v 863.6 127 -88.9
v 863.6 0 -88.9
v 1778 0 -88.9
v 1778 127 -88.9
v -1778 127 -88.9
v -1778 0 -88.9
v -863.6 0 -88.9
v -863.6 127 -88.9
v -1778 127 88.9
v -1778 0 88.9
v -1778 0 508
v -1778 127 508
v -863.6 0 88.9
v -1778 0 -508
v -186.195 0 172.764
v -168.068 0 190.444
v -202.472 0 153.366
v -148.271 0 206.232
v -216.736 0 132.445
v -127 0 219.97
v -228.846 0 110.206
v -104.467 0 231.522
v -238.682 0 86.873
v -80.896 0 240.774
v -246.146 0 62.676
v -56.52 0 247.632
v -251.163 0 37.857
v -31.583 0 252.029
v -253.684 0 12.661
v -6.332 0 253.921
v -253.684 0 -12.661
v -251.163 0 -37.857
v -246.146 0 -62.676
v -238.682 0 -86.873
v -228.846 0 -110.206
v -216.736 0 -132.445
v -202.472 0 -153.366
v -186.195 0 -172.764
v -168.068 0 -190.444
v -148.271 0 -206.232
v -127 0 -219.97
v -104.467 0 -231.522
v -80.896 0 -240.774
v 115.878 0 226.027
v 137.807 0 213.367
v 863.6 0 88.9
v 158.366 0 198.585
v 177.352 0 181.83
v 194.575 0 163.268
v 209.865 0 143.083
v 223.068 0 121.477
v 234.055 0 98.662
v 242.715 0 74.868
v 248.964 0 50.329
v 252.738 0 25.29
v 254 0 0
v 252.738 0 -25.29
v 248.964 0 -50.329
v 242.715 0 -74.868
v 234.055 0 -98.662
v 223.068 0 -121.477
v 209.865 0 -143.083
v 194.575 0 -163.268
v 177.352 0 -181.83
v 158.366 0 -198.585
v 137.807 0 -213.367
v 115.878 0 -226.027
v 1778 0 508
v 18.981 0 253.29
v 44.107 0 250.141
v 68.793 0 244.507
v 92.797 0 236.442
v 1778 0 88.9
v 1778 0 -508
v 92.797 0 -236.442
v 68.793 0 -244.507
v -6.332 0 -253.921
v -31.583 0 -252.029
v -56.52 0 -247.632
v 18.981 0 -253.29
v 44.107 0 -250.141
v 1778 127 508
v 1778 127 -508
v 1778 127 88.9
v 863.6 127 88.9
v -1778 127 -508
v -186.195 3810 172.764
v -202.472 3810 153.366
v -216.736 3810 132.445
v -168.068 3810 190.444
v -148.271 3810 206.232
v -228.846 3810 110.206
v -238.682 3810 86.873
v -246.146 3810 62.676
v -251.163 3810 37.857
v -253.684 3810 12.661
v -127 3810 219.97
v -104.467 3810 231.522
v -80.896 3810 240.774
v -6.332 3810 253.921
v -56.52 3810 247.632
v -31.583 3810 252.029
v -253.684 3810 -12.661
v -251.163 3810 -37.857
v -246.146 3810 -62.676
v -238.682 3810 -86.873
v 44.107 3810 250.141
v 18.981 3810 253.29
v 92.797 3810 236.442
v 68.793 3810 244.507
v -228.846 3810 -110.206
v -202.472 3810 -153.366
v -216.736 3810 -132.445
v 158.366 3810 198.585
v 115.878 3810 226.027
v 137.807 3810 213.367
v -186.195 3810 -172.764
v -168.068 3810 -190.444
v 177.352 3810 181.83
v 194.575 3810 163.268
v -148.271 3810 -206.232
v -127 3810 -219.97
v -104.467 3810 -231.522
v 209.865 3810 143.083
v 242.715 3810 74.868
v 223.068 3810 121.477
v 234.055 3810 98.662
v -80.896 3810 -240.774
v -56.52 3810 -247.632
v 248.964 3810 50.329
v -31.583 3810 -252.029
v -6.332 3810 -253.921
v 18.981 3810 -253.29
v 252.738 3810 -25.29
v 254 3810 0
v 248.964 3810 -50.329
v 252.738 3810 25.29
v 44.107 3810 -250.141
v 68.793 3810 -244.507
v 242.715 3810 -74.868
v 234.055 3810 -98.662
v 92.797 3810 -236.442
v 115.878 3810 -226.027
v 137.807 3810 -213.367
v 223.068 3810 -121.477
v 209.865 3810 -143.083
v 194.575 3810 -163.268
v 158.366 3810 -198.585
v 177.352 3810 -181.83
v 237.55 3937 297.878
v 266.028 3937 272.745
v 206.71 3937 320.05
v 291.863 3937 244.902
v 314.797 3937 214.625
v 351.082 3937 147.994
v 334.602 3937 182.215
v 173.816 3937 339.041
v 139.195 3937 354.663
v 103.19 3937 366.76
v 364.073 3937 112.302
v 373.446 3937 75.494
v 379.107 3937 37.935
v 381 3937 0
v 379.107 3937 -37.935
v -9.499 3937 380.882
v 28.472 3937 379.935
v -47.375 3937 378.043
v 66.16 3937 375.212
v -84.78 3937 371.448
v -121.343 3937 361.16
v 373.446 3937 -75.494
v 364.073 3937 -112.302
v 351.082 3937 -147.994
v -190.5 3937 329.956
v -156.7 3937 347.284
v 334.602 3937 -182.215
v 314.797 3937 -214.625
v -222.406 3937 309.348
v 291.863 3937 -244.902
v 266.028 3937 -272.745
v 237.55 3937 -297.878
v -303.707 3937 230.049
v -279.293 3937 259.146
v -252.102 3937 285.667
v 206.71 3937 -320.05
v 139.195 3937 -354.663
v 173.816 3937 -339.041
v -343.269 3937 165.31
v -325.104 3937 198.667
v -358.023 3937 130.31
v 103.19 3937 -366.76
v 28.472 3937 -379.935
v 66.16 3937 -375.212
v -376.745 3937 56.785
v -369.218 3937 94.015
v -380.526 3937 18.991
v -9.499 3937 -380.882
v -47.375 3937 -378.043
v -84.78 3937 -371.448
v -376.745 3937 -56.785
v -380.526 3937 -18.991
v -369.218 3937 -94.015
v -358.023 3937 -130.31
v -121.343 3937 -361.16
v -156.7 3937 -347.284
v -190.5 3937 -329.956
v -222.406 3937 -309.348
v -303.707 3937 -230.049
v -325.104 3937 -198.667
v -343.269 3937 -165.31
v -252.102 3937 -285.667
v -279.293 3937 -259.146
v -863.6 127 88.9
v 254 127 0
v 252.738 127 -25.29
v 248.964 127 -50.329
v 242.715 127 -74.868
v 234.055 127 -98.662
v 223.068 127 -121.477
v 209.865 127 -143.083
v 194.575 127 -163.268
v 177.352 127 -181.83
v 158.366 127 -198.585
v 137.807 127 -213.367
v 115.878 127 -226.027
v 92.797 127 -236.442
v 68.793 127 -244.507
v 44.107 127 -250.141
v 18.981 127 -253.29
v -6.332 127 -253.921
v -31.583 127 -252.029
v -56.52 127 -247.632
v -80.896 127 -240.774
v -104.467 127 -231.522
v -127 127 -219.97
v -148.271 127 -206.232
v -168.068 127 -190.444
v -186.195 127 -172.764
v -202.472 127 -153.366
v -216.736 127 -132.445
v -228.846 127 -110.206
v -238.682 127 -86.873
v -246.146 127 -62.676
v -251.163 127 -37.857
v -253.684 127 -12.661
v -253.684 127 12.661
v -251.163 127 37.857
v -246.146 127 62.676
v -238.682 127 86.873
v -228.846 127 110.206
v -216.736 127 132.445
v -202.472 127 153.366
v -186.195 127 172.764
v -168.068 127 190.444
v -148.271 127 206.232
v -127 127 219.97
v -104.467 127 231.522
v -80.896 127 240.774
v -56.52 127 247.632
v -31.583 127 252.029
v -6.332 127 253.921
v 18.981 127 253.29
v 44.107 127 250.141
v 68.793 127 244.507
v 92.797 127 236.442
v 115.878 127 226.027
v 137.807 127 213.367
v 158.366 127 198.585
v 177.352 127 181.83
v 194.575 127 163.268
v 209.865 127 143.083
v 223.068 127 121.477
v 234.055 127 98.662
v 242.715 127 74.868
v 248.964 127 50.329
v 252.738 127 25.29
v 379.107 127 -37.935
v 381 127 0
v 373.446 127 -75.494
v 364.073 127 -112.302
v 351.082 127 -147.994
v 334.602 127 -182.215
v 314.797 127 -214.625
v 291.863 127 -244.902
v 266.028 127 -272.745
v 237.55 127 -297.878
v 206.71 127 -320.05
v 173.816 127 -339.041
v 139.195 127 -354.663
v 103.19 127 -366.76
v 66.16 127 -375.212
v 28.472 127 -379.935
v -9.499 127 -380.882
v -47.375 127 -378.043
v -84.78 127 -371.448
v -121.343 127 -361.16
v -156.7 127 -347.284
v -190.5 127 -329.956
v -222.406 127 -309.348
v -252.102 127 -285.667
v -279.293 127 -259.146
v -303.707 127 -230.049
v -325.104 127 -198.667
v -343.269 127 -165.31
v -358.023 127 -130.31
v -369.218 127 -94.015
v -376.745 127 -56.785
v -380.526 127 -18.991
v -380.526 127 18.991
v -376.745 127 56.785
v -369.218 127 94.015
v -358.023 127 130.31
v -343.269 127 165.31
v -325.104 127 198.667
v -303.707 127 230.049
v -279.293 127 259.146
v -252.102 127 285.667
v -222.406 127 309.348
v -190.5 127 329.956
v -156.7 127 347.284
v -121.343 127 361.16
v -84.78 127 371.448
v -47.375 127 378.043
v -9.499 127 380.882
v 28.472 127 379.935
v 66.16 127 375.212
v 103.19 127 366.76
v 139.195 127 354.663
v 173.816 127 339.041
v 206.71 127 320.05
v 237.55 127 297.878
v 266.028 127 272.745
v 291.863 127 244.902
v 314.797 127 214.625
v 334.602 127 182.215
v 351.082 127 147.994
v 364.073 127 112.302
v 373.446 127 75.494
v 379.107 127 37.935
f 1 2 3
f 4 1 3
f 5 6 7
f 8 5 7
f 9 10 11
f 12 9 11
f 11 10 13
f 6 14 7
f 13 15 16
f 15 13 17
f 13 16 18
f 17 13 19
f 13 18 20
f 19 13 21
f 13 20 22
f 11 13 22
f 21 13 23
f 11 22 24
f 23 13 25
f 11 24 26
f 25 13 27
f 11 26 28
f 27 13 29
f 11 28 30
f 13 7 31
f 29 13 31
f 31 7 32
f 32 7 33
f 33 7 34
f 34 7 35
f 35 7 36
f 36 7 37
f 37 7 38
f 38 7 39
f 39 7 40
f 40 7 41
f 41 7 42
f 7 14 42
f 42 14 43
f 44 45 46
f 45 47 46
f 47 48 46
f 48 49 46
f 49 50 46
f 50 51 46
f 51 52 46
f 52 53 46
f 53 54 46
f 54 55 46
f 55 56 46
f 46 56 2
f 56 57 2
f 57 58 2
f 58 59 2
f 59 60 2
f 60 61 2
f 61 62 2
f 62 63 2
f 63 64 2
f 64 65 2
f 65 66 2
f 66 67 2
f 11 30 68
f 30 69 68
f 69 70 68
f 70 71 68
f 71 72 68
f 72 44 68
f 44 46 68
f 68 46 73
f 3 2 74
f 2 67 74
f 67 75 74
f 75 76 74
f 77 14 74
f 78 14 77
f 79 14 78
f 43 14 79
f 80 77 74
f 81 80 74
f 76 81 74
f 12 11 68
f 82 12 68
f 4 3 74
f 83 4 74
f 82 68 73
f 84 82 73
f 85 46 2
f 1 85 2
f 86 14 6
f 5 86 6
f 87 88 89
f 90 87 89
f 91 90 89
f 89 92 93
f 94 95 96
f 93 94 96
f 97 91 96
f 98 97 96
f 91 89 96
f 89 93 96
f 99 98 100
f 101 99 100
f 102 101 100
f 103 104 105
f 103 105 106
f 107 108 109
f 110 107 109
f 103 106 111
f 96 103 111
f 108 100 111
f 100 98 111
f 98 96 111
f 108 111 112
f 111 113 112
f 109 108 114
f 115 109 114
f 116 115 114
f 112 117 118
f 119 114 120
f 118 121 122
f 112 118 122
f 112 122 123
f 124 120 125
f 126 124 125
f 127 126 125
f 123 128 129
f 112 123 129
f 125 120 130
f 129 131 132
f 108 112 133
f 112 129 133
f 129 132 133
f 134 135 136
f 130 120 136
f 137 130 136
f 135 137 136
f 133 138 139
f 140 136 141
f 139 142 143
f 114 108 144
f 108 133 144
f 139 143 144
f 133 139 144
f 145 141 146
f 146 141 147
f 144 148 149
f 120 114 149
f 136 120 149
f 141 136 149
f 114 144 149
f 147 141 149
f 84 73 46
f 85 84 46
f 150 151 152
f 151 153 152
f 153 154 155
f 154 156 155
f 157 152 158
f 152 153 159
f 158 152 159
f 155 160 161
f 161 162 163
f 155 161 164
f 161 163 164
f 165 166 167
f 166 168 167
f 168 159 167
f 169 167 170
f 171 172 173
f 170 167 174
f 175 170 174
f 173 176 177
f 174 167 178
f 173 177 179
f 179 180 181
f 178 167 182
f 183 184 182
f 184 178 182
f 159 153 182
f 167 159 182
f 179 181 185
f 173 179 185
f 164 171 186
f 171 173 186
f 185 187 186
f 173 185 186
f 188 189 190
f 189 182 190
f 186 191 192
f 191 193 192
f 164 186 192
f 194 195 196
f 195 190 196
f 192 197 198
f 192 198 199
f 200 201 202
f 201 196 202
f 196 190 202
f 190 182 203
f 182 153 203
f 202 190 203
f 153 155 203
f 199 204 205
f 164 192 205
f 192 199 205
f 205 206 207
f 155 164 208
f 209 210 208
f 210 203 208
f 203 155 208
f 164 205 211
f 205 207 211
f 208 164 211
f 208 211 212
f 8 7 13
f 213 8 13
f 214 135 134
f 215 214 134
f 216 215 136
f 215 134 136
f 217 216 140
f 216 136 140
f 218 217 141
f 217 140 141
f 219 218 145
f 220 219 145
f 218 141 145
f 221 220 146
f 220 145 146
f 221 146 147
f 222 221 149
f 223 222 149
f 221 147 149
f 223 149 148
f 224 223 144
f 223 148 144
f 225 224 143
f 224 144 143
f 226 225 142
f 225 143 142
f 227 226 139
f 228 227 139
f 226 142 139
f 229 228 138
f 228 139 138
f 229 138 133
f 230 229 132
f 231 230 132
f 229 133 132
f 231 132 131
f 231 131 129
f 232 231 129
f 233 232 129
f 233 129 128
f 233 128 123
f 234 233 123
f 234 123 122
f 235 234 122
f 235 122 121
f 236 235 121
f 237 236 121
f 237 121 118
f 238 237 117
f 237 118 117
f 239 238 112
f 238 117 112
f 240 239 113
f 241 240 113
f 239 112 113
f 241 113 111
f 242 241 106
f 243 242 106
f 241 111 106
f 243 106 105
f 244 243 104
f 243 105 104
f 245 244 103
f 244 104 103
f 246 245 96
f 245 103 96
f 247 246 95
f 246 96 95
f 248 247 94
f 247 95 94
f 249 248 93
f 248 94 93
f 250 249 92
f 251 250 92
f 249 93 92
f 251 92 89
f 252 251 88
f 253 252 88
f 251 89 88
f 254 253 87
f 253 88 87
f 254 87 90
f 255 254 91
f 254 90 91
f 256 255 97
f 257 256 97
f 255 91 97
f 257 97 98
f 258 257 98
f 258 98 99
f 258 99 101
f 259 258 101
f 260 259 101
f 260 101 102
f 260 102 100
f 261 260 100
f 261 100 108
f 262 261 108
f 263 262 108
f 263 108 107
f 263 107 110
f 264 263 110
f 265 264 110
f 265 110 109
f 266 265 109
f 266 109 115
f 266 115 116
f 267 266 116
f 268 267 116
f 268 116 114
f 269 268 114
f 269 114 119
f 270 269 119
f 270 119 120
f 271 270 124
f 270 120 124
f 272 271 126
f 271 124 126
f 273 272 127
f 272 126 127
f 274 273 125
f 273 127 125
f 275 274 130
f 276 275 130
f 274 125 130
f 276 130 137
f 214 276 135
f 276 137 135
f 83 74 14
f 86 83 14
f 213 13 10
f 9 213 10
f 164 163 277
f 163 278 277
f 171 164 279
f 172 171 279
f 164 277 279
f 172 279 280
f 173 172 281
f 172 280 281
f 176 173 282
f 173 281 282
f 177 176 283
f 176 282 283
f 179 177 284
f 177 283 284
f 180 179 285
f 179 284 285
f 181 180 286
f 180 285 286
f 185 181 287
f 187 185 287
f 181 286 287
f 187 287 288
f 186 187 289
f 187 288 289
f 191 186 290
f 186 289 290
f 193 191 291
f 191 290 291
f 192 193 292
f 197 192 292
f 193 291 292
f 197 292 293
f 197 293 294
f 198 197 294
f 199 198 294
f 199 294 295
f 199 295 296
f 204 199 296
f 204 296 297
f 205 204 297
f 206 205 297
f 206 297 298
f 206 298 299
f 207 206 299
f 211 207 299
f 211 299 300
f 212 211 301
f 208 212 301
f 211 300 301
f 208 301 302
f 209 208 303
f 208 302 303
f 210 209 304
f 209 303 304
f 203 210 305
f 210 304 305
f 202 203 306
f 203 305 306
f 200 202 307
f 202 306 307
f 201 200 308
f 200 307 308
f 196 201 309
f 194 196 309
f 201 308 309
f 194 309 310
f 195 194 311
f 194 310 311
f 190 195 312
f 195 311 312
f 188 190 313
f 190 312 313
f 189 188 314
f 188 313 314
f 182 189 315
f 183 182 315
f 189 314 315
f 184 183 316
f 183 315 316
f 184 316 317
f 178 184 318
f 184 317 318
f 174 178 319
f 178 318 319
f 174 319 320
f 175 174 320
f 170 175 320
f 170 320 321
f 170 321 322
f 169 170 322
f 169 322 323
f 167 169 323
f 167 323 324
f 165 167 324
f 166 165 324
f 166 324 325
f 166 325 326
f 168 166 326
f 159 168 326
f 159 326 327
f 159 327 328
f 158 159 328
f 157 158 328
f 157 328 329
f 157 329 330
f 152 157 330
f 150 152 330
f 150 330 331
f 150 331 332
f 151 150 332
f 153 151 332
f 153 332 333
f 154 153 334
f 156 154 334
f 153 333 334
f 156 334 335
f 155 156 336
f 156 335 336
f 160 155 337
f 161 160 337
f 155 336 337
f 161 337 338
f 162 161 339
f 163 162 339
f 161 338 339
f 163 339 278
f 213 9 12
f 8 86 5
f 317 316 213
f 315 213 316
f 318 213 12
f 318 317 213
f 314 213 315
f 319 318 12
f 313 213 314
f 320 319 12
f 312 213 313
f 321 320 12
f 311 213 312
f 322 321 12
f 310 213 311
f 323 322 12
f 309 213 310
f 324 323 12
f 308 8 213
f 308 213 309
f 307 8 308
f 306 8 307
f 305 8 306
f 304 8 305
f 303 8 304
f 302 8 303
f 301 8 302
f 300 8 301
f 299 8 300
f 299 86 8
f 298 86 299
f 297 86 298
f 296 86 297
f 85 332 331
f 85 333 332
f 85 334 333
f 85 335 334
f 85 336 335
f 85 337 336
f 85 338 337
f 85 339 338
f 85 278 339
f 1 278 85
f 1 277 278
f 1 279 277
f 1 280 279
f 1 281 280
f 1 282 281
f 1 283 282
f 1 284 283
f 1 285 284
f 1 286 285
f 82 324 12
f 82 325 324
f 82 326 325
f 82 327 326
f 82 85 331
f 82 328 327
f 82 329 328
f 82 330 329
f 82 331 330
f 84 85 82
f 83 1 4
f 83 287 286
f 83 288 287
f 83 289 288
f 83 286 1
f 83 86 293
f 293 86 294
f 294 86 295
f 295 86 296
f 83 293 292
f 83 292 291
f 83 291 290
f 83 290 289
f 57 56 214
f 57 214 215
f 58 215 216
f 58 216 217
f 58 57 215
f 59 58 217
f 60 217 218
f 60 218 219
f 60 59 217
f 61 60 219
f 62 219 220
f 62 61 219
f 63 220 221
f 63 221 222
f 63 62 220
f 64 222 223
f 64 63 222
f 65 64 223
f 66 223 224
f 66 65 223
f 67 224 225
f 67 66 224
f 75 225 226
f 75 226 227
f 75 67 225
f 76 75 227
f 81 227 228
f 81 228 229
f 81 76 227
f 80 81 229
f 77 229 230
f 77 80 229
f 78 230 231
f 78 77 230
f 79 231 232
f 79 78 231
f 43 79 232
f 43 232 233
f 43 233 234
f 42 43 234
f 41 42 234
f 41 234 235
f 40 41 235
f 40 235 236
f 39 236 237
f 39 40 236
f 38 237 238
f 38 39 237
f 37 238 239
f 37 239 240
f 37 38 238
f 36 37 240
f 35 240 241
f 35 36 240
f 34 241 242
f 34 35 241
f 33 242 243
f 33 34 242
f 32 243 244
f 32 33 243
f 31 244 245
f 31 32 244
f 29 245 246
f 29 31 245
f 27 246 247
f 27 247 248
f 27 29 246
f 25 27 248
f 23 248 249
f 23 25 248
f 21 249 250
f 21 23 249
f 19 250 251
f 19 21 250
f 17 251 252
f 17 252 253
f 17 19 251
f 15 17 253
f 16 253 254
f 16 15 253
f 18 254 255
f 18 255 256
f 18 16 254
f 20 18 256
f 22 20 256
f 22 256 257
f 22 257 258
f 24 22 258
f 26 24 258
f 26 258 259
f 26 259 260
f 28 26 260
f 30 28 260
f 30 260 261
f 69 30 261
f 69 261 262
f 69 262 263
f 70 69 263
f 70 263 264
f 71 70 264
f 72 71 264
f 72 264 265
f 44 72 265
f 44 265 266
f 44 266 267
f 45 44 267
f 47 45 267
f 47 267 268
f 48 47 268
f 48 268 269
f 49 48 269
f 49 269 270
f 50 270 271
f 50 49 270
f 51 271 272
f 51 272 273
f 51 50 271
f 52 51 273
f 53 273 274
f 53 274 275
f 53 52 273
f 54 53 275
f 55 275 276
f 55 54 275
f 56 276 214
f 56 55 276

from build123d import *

# Parameters (mm, degrees)
SKETCH2_R           = 254
BOSS_EXTRUDE1_DEPTH = 127


with BuildPart() as part:
    # Sketch2 → Boss-Extrude1 (new body)
    with BuildSketch(Plane(origin=(0, 0, 0), x_dir=(1, 0, 0), z_dir=(0, 1, 0))):
        Polygon((1778, 508), (-1778, 508), (-1778, 88.9), (-863.6, 88.9), (-863.6, -88.9), (-1778, -88.9), (-1778, -508), (1778, -508), (1778, -88.9), (863.6, -88.9), (863.6, 88.9), (1778, 88.9), align=None)
        Circle(SKETCH2_R, mode=Mode.SUBTRACT)
    extrude(amount=BOSS_EXTRUDE1_DEPTH)

    # Sketch3 → Revolve1 (revolve)
    with BuildSketch(Plane.XY):
        Polygon((0, 3937), (381, 3937), (381, 127), (254, 127), (254, 3810), (0, 3810), align=None)
    revolve(axis=Axis((0, 0, 0), (0, 1, 0)))


solid = part.part
